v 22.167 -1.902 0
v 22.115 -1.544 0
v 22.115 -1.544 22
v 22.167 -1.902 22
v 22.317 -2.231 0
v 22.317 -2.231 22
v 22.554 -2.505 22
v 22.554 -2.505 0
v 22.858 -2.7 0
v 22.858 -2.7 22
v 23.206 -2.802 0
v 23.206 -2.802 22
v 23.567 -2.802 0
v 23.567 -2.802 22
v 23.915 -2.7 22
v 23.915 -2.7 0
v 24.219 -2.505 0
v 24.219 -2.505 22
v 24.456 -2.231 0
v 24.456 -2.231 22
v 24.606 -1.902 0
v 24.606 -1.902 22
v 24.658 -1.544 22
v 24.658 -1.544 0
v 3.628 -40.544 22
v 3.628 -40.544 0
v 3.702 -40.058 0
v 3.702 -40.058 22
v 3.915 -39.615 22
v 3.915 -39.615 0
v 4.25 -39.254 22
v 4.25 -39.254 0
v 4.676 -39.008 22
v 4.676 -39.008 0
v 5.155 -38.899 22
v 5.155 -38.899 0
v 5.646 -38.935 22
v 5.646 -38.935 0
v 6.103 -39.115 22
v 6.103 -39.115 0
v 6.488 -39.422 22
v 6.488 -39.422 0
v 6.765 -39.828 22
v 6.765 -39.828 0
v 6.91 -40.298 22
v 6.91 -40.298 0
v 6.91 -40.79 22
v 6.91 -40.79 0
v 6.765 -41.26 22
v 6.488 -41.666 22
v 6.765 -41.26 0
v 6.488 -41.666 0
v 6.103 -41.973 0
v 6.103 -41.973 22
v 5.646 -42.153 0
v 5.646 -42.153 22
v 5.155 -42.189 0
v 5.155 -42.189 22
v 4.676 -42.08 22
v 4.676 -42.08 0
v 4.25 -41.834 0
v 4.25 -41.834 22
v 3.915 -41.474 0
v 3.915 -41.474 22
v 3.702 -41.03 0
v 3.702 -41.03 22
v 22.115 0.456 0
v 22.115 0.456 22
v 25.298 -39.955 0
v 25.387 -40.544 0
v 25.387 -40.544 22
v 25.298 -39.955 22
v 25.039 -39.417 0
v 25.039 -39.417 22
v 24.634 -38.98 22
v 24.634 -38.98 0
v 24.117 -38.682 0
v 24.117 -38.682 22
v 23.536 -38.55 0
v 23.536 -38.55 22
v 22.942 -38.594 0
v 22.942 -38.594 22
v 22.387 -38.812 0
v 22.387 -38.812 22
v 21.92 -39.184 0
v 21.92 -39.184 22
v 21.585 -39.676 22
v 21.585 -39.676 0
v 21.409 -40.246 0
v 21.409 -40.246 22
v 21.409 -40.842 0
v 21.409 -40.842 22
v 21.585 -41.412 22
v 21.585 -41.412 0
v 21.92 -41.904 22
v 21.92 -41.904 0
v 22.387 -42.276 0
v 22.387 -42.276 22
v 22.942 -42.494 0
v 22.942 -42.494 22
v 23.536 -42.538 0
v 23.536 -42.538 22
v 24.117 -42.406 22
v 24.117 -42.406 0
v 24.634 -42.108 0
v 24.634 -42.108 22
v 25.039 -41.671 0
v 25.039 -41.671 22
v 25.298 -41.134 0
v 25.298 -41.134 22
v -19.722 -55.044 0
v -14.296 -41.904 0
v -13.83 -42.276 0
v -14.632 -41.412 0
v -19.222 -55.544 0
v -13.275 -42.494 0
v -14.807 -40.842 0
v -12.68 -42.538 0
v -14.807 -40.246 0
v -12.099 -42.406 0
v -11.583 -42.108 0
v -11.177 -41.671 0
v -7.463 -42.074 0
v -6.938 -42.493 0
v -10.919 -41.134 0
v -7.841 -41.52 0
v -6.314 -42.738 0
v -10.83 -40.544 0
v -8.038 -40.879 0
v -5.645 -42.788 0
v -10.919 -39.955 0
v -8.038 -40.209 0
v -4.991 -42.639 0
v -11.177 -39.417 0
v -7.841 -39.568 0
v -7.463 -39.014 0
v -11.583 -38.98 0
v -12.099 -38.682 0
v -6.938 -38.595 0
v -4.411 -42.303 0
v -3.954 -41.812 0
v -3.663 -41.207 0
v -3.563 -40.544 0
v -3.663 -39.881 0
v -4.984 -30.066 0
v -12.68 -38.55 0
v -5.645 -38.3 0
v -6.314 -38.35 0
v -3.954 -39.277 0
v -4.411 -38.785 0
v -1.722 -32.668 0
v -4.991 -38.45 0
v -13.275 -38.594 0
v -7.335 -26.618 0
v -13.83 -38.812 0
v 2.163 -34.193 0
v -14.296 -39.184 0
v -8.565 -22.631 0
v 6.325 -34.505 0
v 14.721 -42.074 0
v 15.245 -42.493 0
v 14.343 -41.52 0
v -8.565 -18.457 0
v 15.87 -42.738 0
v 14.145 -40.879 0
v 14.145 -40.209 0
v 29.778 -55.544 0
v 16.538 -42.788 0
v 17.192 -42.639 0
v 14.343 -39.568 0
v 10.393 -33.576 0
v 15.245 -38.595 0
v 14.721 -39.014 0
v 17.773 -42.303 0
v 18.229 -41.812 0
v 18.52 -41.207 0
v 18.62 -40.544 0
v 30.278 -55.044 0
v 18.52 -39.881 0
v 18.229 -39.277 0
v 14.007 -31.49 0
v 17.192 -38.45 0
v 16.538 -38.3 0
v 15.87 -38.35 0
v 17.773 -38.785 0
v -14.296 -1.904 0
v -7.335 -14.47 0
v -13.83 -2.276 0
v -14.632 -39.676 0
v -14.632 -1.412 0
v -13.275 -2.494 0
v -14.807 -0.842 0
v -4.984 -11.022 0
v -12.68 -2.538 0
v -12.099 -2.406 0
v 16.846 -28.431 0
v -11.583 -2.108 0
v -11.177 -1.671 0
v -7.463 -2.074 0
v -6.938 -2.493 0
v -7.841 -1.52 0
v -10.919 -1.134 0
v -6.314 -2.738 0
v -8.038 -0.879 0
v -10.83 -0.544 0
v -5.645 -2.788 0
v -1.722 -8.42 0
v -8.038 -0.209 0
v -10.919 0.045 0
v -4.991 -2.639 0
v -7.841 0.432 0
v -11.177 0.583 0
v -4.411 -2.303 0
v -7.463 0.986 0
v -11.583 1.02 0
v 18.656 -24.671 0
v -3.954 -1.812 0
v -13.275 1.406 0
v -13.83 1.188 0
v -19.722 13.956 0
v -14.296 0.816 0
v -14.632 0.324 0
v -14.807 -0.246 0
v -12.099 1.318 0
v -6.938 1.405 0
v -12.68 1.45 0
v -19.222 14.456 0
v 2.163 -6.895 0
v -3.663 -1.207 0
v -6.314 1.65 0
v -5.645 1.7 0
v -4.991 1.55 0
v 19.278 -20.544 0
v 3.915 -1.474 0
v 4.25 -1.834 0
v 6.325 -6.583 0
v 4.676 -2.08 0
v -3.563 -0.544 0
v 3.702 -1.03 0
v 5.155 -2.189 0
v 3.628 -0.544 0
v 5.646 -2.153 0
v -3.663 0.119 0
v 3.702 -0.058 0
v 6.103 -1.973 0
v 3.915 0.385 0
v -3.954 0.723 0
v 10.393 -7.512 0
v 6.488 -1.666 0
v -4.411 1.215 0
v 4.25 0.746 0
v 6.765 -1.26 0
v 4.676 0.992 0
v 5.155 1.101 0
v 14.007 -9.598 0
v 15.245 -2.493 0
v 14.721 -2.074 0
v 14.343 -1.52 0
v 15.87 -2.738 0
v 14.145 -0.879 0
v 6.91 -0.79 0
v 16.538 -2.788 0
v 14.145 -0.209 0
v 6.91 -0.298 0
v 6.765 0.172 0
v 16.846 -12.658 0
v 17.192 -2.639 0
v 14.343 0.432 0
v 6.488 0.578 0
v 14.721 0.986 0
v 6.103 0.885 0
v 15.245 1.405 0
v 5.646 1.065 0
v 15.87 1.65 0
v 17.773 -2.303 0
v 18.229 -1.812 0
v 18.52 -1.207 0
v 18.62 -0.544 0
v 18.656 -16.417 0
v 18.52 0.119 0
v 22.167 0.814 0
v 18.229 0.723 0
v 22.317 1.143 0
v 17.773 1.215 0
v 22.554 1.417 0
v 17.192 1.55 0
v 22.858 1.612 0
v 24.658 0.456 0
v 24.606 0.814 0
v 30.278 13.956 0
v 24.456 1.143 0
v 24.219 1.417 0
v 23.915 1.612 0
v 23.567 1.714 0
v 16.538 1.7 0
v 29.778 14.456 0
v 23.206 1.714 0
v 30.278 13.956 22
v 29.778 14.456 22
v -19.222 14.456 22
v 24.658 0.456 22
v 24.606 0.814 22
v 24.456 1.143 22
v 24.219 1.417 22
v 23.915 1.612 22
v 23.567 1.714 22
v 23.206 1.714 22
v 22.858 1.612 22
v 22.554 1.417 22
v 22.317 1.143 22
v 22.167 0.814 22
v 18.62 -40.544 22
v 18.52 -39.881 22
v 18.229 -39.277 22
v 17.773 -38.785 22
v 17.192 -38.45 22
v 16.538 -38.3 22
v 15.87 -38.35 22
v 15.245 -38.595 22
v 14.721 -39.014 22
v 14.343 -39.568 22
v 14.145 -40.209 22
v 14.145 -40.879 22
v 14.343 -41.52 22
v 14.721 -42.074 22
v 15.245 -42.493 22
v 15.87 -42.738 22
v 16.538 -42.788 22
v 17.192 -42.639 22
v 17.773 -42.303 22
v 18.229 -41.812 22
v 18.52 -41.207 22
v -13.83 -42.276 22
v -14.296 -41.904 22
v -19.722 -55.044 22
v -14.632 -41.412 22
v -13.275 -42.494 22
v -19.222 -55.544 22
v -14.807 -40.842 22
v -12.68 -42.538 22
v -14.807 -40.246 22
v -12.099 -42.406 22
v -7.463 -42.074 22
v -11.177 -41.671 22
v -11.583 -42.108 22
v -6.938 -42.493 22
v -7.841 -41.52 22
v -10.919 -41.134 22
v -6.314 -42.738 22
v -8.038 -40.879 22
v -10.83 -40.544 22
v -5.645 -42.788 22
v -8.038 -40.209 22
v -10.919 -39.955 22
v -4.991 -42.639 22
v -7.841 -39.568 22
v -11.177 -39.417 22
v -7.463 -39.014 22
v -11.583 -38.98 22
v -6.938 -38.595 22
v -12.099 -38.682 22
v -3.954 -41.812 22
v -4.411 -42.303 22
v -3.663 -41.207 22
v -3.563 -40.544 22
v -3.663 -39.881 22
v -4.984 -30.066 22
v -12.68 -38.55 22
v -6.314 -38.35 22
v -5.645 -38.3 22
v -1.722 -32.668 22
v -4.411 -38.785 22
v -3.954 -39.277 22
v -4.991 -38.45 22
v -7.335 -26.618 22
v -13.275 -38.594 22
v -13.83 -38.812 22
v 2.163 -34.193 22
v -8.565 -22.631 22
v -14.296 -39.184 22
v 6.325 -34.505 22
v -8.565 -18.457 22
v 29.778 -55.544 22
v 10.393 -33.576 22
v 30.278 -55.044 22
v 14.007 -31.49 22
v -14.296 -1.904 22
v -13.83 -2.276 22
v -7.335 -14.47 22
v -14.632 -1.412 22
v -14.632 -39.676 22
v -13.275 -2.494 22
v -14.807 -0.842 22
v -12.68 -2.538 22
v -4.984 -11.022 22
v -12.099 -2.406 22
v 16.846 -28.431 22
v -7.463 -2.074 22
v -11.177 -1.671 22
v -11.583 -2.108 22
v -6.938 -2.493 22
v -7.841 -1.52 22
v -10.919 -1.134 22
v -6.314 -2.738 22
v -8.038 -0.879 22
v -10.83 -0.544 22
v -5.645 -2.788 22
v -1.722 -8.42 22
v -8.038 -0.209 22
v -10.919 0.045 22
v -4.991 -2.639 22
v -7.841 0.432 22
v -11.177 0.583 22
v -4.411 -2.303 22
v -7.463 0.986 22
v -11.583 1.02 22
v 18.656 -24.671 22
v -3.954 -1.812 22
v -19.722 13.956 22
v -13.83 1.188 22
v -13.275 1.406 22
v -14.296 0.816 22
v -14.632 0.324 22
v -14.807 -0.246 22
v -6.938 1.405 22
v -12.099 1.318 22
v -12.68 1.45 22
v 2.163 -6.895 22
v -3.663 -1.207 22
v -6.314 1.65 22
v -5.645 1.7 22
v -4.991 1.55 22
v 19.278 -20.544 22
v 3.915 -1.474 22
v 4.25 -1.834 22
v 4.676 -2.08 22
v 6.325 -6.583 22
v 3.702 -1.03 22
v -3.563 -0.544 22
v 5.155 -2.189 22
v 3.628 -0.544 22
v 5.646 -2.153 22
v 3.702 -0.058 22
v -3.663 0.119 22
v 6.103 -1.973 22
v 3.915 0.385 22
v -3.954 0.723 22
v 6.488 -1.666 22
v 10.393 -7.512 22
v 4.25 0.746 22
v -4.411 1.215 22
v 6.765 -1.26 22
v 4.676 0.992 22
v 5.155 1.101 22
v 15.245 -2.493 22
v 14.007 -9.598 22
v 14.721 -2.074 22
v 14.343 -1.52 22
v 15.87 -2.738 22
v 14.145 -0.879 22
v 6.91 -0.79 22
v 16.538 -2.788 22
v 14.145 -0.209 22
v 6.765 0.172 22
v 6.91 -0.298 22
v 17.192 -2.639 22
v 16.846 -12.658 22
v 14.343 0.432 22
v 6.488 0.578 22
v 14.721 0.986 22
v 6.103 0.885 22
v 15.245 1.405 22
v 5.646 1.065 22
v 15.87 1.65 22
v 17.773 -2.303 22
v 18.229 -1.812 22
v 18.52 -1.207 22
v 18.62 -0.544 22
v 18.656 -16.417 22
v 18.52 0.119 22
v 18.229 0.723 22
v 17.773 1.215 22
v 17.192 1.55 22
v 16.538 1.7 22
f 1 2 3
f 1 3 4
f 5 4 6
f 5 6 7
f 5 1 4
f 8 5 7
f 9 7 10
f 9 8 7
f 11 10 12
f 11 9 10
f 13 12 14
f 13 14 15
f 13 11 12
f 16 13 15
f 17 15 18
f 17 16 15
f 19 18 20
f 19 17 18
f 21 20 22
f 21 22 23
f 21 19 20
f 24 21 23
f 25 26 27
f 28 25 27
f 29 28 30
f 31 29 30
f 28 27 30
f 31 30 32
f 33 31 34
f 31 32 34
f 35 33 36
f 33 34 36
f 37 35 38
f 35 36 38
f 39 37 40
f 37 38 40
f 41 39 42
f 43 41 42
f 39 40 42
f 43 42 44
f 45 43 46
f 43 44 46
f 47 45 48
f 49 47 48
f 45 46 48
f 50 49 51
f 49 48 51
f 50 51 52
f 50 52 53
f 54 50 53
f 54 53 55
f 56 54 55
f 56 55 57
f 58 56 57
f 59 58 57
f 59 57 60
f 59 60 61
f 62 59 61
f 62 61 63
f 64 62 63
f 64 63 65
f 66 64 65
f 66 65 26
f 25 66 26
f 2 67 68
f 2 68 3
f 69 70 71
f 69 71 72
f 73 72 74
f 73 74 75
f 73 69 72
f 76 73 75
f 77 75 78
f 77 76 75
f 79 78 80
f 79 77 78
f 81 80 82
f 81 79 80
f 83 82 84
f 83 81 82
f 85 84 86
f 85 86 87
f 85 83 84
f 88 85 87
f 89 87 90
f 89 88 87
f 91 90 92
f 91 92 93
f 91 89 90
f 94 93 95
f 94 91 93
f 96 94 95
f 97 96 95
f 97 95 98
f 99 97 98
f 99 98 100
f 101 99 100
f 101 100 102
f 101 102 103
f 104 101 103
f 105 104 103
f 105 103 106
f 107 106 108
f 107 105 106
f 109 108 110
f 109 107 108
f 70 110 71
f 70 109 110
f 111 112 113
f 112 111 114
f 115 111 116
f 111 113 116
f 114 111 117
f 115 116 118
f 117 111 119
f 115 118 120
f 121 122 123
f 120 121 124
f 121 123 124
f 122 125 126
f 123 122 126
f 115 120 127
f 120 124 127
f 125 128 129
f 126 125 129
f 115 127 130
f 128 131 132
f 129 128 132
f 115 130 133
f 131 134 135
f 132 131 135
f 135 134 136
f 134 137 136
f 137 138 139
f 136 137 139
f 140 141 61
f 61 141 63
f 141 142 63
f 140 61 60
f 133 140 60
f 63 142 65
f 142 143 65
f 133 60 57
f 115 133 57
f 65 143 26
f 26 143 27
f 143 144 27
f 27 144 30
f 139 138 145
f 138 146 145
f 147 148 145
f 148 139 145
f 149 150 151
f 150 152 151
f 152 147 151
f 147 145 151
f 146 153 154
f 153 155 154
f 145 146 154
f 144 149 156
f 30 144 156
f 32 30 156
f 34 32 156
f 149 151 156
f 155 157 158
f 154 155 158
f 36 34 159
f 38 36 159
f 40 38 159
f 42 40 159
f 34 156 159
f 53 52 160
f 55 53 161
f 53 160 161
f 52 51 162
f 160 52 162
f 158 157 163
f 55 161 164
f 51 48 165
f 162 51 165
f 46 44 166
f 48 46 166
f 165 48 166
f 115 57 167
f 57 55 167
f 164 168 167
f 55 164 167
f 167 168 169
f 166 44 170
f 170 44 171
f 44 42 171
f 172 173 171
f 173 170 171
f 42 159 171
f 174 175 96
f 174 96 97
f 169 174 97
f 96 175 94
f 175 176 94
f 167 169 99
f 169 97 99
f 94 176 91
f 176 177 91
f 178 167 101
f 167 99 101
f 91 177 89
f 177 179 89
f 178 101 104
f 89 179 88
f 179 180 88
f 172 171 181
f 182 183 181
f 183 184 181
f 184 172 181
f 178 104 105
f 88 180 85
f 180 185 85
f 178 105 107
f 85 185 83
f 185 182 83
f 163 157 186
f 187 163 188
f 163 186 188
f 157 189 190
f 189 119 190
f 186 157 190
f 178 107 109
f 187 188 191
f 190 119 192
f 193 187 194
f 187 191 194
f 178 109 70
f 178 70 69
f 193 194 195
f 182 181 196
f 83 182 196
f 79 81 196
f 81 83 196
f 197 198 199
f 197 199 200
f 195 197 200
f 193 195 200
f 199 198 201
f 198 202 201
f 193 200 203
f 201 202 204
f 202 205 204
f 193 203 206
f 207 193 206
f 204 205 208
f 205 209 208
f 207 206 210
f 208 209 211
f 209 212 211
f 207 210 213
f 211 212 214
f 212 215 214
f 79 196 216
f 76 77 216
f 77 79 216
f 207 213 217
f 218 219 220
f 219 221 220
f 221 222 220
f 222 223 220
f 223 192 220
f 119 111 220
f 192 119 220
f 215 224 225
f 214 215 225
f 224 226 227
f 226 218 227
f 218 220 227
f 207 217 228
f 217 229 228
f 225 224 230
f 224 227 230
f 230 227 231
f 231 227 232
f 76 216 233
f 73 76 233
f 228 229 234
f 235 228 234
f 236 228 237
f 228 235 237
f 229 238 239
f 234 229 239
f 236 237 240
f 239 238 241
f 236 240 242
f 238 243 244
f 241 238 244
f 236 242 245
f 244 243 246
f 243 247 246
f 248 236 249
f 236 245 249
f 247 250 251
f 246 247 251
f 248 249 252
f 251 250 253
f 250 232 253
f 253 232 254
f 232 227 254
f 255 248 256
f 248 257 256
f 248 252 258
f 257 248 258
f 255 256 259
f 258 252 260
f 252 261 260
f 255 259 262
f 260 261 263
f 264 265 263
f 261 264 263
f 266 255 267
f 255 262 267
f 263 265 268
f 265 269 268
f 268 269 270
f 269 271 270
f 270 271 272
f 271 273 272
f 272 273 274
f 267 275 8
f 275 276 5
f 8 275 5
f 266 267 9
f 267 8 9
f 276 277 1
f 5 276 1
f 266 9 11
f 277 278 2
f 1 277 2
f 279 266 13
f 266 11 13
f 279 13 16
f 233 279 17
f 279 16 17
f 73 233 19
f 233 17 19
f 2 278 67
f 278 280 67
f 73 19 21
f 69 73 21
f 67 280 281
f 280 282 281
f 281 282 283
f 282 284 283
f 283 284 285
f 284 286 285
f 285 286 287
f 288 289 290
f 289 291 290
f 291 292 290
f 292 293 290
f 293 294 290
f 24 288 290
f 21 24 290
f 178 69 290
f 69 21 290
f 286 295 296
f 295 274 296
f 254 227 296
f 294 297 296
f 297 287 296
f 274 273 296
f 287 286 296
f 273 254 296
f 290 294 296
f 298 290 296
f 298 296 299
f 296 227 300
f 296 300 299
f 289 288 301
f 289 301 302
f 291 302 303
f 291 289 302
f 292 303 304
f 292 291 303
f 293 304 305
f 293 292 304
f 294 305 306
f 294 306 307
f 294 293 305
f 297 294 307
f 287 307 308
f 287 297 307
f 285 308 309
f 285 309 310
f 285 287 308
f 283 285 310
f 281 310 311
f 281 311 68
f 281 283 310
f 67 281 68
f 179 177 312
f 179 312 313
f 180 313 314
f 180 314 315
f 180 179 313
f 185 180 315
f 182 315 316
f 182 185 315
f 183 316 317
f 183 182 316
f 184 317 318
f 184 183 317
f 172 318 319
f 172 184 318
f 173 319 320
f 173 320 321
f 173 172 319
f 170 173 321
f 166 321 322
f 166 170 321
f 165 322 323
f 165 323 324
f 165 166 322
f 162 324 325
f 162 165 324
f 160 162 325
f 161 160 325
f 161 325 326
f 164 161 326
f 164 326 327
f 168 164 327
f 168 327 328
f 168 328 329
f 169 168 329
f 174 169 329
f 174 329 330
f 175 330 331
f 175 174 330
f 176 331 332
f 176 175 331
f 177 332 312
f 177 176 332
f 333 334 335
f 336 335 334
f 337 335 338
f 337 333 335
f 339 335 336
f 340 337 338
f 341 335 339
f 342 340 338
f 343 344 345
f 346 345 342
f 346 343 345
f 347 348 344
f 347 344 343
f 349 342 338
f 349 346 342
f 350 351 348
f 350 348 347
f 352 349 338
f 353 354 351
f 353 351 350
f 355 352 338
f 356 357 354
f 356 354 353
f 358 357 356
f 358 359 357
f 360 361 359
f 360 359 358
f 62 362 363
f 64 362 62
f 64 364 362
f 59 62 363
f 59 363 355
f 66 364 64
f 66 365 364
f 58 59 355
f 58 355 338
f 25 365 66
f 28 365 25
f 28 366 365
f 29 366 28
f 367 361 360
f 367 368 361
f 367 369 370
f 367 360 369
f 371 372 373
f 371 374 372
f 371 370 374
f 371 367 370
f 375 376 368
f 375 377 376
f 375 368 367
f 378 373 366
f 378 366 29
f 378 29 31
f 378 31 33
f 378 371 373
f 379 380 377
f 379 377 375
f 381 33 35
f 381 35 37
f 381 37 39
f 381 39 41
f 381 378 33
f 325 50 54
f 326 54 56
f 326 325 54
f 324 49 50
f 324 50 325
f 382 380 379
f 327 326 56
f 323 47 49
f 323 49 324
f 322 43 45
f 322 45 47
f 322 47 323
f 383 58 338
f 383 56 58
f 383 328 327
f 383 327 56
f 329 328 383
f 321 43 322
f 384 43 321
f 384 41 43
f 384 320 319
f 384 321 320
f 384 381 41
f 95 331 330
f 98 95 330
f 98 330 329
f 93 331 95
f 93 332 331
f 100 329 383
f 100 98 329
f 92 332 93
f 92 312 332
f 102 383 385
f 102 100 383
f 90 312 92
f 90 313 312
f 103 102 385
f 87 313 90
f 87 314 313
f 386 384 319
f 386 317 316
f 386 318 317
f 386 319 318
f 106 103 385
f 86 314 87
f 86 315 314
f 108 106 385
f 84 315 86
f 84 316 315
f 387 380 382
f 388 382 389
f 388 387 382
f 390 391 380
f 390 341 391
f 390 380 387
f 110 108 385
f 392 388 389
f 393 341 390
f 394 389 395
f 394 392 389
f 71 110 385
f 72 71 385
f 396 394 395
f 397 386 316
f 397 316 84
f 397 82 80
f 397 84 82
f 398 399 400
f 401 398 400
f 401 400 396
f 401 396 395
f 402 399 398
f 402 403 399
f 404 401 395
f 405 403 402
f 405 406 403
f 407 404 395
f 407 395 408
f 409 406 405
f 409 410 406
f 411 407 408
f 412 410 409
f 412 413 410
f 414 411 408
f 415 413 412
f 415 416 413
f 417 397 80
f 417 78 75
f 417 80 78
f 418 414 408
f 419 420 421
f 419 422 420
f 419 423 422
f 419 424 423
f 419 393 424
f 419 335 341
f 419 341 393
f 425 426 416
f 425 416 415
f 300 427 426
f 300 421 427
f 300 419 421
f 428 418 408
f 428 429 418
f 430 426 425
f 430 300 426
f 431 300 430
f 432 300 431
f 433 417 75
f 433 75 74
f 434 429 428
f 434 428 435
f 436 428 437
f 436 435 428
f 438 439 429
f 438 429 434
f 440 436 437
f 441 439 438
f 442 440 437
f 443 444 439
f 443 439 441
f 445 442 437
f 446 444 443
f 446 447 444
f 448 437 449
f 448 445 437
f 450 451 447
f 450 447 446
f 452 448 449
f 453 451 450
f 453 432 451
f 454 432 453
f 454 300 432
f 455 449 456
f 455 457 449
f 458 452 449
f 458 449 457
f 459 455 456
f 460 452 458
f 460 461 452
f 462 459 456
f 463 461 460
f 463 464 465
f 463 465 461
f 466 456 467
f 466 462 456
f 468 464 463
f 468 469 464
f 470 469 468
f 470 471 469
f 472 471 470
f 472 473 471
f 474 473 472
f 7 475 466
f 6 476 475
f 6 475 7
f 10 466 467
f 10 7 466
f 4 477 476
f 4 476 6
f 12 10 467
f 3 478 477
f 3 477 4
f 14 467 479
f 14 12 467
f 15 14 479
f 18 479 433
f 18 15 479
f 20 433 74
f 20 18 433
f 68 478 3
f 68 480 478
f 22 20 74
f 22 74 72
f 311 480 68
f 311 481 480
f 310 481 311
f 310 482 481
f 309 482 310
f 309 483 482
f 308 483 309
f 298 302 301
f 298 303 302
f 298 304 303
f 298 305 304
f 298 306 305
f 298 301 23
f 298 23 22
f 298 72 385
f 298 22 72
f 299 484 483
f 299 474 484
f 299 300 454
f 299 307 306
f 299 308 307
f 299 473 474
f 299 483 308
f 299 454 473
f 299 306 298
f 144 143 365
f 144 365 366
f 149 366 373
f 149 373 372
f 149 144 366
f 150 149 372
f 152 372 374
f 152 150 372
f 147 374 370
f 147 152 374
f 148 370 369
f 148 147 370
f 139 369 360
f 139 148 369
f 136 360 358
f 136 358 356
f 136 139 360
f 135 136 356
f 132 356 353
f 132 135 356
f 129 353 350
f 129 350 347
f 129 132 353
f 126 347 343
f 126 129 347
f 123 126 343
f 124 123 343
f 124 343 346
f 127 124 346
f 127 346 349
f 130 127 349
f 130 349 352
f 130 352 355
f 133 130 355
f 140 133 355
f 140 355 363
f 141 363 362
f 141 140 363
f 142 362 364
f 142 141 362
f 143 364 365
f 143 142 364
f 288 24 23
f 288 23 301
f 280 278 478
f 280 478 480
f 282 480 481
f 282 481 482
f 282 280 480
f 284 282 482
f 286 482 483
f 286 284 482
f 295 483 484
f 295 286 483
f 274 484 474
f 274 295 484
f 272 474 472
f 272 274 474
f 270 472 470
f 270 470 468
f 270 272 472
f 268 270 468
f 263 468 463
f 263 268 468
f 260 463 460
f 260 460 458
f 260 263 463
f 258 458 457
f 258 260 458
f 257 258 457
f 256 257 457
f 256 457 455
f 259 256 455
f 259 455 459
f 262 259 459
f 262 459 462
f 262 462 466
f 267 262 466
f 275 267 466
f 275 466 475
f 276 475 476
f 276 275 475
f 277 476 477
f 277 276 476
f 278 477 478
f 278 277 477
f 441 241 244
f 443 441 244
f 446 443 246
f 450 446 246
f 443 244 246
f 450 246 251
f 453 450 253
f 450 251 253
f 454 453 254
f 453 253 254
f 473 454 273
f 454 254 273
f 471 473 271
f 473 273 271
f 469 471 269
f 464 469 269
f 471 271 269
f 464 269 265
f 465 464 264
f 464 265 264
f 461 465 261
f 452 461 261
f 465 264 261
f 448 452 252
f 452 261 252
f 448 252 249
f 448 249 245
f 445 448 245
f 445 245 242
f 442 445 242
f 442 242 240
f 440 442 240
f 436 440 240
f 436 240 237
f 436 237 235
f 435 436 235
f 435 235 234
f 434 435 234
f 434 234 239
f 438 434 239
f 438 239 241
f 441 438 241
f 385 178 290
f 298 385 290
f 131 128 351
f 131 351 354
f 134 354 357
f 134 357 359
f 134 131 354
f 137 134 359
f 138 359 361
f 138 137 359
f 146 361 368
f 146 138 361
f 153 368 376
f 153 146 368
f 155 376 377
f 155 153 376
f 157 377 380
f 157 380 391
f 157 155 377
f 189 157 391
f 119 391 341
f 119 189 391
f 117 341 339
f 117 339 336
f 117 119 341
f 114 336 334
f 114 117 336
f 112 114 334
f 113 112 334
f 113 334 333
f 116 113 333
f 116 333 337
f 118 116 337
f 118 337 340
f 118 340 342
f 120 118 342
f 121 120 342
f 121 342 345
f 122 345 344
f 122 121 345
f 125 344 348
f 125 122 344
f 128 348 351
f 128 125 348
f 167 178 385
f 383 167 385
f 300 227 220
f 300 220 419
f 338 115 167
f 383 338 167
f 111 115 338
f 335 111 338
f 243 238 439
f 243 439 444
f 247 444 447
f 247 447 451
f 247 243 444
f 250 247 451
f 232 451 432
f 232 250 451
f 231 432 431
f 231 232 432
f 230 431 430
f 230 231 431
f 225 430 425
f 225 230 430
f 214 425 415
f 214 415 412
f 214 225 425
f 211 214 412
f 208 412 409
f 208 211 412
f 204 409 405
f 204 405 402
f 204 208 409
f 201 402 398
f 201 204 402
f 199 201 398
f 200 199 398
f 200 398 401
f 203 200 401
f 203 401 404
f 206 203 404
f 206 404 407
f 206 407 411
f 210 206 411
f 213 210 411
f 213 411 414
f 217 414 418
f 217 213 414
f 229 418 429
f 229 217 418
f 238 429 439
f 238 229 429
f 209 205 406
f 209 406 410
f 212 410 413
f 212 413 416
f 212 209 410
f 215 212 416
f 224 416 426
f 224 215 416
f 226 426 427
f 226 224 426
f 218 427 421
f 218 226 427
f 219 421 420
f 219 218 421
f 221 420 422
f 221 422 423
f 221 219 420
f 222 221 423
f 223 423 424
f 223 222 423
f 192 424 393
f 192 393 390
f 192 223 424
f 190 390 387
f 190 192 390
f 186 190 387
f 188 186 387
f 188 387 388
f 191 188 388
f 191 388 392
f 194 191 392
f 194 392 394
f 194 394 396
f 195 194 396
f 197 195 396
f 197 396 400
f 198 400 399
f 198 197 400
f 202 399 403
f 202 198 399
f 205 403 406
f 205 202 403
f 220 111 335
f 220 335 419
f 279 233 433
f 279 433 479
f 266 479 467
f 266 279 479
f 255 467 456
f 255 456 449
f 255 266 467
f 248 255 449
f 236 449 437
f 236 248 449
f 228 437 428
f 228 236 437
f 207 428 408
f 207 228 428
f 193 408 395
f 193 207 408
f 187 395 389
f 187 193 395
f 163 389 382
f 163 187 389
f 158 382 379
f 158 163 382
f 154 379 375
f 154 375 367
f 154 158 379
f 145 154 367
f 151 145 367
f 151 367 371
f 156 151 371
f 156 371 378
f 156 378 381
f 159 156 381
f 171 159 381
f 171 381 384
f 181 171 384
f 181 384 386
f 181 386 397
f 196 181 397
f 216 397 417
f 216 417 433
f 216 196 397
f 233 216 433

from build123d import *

# Parameters (mm, degrees)
SKETCH1_W           = 50
SKETCH1_H           = 70
SKETCH1_R           = 14
SKETCH1_R_2         = 2
SKETCH1_R_3         = 2.25
BOSS_EXTRUDE1_DEPTH = 22
M4_TAPPED_HOLE1_D   = 3.3
CHAMFER1_SIZE       = 0.5


with BuildPart() as part:
    # Sketch1 → Boss-Extrude1 (new body)
    with BuildSketch(Plane.XY):
        with Locations((5.278422274, -20.544056224)):
            Rectangle(SKETCH1_W, SKETCH1_H)
        with Locations((5.278422274, -20.544056224)):
            Circle(SKETCH1_R, mode=Mode.SUBTRACT)
        with Locations((-12.829698376, -0.544056224)):
            Circle(SKETCH1_R_2, mode=Mode.SUBTRACT)
        with Locations((-5.813457077, -0.544056224)):
            Circle(SKETCH1_R_3, mode=Mode.SUBTRACT)
        with Locations((-5.813457077, -40.544056224)):
            Circle(SKETCH1_R_3, mode=Mode.SUBTRACT)
        with Locations((-12.829698376, -40.544056224)):
            Circle(SKETCH1_R_2, mode=Mode.SUBTRACT)
        with Locations((23.386542923, -40.544056224)):
            Circle(SKETCH1_R_2, mode=Mode.SUBTRACT)
        with Locations((16.370301624, -40.544056224)):
            Circle(SKETCH1_R_3, mode=Mode.SUBTRACT)
        with Locations((16.370301624, -0.544056224)):
            Circle(SKETCH1_R_3, mode=Mode.SUBTRACT)
        with BuildLine():
            Line((22.115366155, 0.455943776), (22.115366155, -1.544056224))
            ThreePointArc((22.115366155, -1.544056224), (23.386542923, -2.815232993), (24.657719692, -1.544056224))
            Line((24.657719692, -1.544056224), (24.657719692, 0.455943776))
            ThreePointArc((24.657719692, 0.455943776), (23.386542923, 1.727120544), (22.115366155, 0.455943776))
        make_face(mode=Mode.SUBTRACT)
    extrude(amount=BOSS_EXTRUDE1_DEPTH)

    # M4 Tapped Hole1 (through all)
    with Locations(Plane.XY.offset(22)):
        with Locations((5.278422274, -0.544056224), (5.278422274, -40.544056224)):
            Hole(M4_TAPPED_HOLE1_D / 2)

    # Chamfer1
    chamfer1_edges = [part.edges().sort_by_distance(p)[0] for p in [
        (-19.721577726, 14.455943776, 11),
        (30.278422274, 14.455943776, 11),
        (30.278422274, -55.544056224, 11),
        (-19.721577726, -55.544056224, 11),
    ]]
    chamfer(chamfer1_edges, length=CHAMFER1_SIZE)


solid = part.part
